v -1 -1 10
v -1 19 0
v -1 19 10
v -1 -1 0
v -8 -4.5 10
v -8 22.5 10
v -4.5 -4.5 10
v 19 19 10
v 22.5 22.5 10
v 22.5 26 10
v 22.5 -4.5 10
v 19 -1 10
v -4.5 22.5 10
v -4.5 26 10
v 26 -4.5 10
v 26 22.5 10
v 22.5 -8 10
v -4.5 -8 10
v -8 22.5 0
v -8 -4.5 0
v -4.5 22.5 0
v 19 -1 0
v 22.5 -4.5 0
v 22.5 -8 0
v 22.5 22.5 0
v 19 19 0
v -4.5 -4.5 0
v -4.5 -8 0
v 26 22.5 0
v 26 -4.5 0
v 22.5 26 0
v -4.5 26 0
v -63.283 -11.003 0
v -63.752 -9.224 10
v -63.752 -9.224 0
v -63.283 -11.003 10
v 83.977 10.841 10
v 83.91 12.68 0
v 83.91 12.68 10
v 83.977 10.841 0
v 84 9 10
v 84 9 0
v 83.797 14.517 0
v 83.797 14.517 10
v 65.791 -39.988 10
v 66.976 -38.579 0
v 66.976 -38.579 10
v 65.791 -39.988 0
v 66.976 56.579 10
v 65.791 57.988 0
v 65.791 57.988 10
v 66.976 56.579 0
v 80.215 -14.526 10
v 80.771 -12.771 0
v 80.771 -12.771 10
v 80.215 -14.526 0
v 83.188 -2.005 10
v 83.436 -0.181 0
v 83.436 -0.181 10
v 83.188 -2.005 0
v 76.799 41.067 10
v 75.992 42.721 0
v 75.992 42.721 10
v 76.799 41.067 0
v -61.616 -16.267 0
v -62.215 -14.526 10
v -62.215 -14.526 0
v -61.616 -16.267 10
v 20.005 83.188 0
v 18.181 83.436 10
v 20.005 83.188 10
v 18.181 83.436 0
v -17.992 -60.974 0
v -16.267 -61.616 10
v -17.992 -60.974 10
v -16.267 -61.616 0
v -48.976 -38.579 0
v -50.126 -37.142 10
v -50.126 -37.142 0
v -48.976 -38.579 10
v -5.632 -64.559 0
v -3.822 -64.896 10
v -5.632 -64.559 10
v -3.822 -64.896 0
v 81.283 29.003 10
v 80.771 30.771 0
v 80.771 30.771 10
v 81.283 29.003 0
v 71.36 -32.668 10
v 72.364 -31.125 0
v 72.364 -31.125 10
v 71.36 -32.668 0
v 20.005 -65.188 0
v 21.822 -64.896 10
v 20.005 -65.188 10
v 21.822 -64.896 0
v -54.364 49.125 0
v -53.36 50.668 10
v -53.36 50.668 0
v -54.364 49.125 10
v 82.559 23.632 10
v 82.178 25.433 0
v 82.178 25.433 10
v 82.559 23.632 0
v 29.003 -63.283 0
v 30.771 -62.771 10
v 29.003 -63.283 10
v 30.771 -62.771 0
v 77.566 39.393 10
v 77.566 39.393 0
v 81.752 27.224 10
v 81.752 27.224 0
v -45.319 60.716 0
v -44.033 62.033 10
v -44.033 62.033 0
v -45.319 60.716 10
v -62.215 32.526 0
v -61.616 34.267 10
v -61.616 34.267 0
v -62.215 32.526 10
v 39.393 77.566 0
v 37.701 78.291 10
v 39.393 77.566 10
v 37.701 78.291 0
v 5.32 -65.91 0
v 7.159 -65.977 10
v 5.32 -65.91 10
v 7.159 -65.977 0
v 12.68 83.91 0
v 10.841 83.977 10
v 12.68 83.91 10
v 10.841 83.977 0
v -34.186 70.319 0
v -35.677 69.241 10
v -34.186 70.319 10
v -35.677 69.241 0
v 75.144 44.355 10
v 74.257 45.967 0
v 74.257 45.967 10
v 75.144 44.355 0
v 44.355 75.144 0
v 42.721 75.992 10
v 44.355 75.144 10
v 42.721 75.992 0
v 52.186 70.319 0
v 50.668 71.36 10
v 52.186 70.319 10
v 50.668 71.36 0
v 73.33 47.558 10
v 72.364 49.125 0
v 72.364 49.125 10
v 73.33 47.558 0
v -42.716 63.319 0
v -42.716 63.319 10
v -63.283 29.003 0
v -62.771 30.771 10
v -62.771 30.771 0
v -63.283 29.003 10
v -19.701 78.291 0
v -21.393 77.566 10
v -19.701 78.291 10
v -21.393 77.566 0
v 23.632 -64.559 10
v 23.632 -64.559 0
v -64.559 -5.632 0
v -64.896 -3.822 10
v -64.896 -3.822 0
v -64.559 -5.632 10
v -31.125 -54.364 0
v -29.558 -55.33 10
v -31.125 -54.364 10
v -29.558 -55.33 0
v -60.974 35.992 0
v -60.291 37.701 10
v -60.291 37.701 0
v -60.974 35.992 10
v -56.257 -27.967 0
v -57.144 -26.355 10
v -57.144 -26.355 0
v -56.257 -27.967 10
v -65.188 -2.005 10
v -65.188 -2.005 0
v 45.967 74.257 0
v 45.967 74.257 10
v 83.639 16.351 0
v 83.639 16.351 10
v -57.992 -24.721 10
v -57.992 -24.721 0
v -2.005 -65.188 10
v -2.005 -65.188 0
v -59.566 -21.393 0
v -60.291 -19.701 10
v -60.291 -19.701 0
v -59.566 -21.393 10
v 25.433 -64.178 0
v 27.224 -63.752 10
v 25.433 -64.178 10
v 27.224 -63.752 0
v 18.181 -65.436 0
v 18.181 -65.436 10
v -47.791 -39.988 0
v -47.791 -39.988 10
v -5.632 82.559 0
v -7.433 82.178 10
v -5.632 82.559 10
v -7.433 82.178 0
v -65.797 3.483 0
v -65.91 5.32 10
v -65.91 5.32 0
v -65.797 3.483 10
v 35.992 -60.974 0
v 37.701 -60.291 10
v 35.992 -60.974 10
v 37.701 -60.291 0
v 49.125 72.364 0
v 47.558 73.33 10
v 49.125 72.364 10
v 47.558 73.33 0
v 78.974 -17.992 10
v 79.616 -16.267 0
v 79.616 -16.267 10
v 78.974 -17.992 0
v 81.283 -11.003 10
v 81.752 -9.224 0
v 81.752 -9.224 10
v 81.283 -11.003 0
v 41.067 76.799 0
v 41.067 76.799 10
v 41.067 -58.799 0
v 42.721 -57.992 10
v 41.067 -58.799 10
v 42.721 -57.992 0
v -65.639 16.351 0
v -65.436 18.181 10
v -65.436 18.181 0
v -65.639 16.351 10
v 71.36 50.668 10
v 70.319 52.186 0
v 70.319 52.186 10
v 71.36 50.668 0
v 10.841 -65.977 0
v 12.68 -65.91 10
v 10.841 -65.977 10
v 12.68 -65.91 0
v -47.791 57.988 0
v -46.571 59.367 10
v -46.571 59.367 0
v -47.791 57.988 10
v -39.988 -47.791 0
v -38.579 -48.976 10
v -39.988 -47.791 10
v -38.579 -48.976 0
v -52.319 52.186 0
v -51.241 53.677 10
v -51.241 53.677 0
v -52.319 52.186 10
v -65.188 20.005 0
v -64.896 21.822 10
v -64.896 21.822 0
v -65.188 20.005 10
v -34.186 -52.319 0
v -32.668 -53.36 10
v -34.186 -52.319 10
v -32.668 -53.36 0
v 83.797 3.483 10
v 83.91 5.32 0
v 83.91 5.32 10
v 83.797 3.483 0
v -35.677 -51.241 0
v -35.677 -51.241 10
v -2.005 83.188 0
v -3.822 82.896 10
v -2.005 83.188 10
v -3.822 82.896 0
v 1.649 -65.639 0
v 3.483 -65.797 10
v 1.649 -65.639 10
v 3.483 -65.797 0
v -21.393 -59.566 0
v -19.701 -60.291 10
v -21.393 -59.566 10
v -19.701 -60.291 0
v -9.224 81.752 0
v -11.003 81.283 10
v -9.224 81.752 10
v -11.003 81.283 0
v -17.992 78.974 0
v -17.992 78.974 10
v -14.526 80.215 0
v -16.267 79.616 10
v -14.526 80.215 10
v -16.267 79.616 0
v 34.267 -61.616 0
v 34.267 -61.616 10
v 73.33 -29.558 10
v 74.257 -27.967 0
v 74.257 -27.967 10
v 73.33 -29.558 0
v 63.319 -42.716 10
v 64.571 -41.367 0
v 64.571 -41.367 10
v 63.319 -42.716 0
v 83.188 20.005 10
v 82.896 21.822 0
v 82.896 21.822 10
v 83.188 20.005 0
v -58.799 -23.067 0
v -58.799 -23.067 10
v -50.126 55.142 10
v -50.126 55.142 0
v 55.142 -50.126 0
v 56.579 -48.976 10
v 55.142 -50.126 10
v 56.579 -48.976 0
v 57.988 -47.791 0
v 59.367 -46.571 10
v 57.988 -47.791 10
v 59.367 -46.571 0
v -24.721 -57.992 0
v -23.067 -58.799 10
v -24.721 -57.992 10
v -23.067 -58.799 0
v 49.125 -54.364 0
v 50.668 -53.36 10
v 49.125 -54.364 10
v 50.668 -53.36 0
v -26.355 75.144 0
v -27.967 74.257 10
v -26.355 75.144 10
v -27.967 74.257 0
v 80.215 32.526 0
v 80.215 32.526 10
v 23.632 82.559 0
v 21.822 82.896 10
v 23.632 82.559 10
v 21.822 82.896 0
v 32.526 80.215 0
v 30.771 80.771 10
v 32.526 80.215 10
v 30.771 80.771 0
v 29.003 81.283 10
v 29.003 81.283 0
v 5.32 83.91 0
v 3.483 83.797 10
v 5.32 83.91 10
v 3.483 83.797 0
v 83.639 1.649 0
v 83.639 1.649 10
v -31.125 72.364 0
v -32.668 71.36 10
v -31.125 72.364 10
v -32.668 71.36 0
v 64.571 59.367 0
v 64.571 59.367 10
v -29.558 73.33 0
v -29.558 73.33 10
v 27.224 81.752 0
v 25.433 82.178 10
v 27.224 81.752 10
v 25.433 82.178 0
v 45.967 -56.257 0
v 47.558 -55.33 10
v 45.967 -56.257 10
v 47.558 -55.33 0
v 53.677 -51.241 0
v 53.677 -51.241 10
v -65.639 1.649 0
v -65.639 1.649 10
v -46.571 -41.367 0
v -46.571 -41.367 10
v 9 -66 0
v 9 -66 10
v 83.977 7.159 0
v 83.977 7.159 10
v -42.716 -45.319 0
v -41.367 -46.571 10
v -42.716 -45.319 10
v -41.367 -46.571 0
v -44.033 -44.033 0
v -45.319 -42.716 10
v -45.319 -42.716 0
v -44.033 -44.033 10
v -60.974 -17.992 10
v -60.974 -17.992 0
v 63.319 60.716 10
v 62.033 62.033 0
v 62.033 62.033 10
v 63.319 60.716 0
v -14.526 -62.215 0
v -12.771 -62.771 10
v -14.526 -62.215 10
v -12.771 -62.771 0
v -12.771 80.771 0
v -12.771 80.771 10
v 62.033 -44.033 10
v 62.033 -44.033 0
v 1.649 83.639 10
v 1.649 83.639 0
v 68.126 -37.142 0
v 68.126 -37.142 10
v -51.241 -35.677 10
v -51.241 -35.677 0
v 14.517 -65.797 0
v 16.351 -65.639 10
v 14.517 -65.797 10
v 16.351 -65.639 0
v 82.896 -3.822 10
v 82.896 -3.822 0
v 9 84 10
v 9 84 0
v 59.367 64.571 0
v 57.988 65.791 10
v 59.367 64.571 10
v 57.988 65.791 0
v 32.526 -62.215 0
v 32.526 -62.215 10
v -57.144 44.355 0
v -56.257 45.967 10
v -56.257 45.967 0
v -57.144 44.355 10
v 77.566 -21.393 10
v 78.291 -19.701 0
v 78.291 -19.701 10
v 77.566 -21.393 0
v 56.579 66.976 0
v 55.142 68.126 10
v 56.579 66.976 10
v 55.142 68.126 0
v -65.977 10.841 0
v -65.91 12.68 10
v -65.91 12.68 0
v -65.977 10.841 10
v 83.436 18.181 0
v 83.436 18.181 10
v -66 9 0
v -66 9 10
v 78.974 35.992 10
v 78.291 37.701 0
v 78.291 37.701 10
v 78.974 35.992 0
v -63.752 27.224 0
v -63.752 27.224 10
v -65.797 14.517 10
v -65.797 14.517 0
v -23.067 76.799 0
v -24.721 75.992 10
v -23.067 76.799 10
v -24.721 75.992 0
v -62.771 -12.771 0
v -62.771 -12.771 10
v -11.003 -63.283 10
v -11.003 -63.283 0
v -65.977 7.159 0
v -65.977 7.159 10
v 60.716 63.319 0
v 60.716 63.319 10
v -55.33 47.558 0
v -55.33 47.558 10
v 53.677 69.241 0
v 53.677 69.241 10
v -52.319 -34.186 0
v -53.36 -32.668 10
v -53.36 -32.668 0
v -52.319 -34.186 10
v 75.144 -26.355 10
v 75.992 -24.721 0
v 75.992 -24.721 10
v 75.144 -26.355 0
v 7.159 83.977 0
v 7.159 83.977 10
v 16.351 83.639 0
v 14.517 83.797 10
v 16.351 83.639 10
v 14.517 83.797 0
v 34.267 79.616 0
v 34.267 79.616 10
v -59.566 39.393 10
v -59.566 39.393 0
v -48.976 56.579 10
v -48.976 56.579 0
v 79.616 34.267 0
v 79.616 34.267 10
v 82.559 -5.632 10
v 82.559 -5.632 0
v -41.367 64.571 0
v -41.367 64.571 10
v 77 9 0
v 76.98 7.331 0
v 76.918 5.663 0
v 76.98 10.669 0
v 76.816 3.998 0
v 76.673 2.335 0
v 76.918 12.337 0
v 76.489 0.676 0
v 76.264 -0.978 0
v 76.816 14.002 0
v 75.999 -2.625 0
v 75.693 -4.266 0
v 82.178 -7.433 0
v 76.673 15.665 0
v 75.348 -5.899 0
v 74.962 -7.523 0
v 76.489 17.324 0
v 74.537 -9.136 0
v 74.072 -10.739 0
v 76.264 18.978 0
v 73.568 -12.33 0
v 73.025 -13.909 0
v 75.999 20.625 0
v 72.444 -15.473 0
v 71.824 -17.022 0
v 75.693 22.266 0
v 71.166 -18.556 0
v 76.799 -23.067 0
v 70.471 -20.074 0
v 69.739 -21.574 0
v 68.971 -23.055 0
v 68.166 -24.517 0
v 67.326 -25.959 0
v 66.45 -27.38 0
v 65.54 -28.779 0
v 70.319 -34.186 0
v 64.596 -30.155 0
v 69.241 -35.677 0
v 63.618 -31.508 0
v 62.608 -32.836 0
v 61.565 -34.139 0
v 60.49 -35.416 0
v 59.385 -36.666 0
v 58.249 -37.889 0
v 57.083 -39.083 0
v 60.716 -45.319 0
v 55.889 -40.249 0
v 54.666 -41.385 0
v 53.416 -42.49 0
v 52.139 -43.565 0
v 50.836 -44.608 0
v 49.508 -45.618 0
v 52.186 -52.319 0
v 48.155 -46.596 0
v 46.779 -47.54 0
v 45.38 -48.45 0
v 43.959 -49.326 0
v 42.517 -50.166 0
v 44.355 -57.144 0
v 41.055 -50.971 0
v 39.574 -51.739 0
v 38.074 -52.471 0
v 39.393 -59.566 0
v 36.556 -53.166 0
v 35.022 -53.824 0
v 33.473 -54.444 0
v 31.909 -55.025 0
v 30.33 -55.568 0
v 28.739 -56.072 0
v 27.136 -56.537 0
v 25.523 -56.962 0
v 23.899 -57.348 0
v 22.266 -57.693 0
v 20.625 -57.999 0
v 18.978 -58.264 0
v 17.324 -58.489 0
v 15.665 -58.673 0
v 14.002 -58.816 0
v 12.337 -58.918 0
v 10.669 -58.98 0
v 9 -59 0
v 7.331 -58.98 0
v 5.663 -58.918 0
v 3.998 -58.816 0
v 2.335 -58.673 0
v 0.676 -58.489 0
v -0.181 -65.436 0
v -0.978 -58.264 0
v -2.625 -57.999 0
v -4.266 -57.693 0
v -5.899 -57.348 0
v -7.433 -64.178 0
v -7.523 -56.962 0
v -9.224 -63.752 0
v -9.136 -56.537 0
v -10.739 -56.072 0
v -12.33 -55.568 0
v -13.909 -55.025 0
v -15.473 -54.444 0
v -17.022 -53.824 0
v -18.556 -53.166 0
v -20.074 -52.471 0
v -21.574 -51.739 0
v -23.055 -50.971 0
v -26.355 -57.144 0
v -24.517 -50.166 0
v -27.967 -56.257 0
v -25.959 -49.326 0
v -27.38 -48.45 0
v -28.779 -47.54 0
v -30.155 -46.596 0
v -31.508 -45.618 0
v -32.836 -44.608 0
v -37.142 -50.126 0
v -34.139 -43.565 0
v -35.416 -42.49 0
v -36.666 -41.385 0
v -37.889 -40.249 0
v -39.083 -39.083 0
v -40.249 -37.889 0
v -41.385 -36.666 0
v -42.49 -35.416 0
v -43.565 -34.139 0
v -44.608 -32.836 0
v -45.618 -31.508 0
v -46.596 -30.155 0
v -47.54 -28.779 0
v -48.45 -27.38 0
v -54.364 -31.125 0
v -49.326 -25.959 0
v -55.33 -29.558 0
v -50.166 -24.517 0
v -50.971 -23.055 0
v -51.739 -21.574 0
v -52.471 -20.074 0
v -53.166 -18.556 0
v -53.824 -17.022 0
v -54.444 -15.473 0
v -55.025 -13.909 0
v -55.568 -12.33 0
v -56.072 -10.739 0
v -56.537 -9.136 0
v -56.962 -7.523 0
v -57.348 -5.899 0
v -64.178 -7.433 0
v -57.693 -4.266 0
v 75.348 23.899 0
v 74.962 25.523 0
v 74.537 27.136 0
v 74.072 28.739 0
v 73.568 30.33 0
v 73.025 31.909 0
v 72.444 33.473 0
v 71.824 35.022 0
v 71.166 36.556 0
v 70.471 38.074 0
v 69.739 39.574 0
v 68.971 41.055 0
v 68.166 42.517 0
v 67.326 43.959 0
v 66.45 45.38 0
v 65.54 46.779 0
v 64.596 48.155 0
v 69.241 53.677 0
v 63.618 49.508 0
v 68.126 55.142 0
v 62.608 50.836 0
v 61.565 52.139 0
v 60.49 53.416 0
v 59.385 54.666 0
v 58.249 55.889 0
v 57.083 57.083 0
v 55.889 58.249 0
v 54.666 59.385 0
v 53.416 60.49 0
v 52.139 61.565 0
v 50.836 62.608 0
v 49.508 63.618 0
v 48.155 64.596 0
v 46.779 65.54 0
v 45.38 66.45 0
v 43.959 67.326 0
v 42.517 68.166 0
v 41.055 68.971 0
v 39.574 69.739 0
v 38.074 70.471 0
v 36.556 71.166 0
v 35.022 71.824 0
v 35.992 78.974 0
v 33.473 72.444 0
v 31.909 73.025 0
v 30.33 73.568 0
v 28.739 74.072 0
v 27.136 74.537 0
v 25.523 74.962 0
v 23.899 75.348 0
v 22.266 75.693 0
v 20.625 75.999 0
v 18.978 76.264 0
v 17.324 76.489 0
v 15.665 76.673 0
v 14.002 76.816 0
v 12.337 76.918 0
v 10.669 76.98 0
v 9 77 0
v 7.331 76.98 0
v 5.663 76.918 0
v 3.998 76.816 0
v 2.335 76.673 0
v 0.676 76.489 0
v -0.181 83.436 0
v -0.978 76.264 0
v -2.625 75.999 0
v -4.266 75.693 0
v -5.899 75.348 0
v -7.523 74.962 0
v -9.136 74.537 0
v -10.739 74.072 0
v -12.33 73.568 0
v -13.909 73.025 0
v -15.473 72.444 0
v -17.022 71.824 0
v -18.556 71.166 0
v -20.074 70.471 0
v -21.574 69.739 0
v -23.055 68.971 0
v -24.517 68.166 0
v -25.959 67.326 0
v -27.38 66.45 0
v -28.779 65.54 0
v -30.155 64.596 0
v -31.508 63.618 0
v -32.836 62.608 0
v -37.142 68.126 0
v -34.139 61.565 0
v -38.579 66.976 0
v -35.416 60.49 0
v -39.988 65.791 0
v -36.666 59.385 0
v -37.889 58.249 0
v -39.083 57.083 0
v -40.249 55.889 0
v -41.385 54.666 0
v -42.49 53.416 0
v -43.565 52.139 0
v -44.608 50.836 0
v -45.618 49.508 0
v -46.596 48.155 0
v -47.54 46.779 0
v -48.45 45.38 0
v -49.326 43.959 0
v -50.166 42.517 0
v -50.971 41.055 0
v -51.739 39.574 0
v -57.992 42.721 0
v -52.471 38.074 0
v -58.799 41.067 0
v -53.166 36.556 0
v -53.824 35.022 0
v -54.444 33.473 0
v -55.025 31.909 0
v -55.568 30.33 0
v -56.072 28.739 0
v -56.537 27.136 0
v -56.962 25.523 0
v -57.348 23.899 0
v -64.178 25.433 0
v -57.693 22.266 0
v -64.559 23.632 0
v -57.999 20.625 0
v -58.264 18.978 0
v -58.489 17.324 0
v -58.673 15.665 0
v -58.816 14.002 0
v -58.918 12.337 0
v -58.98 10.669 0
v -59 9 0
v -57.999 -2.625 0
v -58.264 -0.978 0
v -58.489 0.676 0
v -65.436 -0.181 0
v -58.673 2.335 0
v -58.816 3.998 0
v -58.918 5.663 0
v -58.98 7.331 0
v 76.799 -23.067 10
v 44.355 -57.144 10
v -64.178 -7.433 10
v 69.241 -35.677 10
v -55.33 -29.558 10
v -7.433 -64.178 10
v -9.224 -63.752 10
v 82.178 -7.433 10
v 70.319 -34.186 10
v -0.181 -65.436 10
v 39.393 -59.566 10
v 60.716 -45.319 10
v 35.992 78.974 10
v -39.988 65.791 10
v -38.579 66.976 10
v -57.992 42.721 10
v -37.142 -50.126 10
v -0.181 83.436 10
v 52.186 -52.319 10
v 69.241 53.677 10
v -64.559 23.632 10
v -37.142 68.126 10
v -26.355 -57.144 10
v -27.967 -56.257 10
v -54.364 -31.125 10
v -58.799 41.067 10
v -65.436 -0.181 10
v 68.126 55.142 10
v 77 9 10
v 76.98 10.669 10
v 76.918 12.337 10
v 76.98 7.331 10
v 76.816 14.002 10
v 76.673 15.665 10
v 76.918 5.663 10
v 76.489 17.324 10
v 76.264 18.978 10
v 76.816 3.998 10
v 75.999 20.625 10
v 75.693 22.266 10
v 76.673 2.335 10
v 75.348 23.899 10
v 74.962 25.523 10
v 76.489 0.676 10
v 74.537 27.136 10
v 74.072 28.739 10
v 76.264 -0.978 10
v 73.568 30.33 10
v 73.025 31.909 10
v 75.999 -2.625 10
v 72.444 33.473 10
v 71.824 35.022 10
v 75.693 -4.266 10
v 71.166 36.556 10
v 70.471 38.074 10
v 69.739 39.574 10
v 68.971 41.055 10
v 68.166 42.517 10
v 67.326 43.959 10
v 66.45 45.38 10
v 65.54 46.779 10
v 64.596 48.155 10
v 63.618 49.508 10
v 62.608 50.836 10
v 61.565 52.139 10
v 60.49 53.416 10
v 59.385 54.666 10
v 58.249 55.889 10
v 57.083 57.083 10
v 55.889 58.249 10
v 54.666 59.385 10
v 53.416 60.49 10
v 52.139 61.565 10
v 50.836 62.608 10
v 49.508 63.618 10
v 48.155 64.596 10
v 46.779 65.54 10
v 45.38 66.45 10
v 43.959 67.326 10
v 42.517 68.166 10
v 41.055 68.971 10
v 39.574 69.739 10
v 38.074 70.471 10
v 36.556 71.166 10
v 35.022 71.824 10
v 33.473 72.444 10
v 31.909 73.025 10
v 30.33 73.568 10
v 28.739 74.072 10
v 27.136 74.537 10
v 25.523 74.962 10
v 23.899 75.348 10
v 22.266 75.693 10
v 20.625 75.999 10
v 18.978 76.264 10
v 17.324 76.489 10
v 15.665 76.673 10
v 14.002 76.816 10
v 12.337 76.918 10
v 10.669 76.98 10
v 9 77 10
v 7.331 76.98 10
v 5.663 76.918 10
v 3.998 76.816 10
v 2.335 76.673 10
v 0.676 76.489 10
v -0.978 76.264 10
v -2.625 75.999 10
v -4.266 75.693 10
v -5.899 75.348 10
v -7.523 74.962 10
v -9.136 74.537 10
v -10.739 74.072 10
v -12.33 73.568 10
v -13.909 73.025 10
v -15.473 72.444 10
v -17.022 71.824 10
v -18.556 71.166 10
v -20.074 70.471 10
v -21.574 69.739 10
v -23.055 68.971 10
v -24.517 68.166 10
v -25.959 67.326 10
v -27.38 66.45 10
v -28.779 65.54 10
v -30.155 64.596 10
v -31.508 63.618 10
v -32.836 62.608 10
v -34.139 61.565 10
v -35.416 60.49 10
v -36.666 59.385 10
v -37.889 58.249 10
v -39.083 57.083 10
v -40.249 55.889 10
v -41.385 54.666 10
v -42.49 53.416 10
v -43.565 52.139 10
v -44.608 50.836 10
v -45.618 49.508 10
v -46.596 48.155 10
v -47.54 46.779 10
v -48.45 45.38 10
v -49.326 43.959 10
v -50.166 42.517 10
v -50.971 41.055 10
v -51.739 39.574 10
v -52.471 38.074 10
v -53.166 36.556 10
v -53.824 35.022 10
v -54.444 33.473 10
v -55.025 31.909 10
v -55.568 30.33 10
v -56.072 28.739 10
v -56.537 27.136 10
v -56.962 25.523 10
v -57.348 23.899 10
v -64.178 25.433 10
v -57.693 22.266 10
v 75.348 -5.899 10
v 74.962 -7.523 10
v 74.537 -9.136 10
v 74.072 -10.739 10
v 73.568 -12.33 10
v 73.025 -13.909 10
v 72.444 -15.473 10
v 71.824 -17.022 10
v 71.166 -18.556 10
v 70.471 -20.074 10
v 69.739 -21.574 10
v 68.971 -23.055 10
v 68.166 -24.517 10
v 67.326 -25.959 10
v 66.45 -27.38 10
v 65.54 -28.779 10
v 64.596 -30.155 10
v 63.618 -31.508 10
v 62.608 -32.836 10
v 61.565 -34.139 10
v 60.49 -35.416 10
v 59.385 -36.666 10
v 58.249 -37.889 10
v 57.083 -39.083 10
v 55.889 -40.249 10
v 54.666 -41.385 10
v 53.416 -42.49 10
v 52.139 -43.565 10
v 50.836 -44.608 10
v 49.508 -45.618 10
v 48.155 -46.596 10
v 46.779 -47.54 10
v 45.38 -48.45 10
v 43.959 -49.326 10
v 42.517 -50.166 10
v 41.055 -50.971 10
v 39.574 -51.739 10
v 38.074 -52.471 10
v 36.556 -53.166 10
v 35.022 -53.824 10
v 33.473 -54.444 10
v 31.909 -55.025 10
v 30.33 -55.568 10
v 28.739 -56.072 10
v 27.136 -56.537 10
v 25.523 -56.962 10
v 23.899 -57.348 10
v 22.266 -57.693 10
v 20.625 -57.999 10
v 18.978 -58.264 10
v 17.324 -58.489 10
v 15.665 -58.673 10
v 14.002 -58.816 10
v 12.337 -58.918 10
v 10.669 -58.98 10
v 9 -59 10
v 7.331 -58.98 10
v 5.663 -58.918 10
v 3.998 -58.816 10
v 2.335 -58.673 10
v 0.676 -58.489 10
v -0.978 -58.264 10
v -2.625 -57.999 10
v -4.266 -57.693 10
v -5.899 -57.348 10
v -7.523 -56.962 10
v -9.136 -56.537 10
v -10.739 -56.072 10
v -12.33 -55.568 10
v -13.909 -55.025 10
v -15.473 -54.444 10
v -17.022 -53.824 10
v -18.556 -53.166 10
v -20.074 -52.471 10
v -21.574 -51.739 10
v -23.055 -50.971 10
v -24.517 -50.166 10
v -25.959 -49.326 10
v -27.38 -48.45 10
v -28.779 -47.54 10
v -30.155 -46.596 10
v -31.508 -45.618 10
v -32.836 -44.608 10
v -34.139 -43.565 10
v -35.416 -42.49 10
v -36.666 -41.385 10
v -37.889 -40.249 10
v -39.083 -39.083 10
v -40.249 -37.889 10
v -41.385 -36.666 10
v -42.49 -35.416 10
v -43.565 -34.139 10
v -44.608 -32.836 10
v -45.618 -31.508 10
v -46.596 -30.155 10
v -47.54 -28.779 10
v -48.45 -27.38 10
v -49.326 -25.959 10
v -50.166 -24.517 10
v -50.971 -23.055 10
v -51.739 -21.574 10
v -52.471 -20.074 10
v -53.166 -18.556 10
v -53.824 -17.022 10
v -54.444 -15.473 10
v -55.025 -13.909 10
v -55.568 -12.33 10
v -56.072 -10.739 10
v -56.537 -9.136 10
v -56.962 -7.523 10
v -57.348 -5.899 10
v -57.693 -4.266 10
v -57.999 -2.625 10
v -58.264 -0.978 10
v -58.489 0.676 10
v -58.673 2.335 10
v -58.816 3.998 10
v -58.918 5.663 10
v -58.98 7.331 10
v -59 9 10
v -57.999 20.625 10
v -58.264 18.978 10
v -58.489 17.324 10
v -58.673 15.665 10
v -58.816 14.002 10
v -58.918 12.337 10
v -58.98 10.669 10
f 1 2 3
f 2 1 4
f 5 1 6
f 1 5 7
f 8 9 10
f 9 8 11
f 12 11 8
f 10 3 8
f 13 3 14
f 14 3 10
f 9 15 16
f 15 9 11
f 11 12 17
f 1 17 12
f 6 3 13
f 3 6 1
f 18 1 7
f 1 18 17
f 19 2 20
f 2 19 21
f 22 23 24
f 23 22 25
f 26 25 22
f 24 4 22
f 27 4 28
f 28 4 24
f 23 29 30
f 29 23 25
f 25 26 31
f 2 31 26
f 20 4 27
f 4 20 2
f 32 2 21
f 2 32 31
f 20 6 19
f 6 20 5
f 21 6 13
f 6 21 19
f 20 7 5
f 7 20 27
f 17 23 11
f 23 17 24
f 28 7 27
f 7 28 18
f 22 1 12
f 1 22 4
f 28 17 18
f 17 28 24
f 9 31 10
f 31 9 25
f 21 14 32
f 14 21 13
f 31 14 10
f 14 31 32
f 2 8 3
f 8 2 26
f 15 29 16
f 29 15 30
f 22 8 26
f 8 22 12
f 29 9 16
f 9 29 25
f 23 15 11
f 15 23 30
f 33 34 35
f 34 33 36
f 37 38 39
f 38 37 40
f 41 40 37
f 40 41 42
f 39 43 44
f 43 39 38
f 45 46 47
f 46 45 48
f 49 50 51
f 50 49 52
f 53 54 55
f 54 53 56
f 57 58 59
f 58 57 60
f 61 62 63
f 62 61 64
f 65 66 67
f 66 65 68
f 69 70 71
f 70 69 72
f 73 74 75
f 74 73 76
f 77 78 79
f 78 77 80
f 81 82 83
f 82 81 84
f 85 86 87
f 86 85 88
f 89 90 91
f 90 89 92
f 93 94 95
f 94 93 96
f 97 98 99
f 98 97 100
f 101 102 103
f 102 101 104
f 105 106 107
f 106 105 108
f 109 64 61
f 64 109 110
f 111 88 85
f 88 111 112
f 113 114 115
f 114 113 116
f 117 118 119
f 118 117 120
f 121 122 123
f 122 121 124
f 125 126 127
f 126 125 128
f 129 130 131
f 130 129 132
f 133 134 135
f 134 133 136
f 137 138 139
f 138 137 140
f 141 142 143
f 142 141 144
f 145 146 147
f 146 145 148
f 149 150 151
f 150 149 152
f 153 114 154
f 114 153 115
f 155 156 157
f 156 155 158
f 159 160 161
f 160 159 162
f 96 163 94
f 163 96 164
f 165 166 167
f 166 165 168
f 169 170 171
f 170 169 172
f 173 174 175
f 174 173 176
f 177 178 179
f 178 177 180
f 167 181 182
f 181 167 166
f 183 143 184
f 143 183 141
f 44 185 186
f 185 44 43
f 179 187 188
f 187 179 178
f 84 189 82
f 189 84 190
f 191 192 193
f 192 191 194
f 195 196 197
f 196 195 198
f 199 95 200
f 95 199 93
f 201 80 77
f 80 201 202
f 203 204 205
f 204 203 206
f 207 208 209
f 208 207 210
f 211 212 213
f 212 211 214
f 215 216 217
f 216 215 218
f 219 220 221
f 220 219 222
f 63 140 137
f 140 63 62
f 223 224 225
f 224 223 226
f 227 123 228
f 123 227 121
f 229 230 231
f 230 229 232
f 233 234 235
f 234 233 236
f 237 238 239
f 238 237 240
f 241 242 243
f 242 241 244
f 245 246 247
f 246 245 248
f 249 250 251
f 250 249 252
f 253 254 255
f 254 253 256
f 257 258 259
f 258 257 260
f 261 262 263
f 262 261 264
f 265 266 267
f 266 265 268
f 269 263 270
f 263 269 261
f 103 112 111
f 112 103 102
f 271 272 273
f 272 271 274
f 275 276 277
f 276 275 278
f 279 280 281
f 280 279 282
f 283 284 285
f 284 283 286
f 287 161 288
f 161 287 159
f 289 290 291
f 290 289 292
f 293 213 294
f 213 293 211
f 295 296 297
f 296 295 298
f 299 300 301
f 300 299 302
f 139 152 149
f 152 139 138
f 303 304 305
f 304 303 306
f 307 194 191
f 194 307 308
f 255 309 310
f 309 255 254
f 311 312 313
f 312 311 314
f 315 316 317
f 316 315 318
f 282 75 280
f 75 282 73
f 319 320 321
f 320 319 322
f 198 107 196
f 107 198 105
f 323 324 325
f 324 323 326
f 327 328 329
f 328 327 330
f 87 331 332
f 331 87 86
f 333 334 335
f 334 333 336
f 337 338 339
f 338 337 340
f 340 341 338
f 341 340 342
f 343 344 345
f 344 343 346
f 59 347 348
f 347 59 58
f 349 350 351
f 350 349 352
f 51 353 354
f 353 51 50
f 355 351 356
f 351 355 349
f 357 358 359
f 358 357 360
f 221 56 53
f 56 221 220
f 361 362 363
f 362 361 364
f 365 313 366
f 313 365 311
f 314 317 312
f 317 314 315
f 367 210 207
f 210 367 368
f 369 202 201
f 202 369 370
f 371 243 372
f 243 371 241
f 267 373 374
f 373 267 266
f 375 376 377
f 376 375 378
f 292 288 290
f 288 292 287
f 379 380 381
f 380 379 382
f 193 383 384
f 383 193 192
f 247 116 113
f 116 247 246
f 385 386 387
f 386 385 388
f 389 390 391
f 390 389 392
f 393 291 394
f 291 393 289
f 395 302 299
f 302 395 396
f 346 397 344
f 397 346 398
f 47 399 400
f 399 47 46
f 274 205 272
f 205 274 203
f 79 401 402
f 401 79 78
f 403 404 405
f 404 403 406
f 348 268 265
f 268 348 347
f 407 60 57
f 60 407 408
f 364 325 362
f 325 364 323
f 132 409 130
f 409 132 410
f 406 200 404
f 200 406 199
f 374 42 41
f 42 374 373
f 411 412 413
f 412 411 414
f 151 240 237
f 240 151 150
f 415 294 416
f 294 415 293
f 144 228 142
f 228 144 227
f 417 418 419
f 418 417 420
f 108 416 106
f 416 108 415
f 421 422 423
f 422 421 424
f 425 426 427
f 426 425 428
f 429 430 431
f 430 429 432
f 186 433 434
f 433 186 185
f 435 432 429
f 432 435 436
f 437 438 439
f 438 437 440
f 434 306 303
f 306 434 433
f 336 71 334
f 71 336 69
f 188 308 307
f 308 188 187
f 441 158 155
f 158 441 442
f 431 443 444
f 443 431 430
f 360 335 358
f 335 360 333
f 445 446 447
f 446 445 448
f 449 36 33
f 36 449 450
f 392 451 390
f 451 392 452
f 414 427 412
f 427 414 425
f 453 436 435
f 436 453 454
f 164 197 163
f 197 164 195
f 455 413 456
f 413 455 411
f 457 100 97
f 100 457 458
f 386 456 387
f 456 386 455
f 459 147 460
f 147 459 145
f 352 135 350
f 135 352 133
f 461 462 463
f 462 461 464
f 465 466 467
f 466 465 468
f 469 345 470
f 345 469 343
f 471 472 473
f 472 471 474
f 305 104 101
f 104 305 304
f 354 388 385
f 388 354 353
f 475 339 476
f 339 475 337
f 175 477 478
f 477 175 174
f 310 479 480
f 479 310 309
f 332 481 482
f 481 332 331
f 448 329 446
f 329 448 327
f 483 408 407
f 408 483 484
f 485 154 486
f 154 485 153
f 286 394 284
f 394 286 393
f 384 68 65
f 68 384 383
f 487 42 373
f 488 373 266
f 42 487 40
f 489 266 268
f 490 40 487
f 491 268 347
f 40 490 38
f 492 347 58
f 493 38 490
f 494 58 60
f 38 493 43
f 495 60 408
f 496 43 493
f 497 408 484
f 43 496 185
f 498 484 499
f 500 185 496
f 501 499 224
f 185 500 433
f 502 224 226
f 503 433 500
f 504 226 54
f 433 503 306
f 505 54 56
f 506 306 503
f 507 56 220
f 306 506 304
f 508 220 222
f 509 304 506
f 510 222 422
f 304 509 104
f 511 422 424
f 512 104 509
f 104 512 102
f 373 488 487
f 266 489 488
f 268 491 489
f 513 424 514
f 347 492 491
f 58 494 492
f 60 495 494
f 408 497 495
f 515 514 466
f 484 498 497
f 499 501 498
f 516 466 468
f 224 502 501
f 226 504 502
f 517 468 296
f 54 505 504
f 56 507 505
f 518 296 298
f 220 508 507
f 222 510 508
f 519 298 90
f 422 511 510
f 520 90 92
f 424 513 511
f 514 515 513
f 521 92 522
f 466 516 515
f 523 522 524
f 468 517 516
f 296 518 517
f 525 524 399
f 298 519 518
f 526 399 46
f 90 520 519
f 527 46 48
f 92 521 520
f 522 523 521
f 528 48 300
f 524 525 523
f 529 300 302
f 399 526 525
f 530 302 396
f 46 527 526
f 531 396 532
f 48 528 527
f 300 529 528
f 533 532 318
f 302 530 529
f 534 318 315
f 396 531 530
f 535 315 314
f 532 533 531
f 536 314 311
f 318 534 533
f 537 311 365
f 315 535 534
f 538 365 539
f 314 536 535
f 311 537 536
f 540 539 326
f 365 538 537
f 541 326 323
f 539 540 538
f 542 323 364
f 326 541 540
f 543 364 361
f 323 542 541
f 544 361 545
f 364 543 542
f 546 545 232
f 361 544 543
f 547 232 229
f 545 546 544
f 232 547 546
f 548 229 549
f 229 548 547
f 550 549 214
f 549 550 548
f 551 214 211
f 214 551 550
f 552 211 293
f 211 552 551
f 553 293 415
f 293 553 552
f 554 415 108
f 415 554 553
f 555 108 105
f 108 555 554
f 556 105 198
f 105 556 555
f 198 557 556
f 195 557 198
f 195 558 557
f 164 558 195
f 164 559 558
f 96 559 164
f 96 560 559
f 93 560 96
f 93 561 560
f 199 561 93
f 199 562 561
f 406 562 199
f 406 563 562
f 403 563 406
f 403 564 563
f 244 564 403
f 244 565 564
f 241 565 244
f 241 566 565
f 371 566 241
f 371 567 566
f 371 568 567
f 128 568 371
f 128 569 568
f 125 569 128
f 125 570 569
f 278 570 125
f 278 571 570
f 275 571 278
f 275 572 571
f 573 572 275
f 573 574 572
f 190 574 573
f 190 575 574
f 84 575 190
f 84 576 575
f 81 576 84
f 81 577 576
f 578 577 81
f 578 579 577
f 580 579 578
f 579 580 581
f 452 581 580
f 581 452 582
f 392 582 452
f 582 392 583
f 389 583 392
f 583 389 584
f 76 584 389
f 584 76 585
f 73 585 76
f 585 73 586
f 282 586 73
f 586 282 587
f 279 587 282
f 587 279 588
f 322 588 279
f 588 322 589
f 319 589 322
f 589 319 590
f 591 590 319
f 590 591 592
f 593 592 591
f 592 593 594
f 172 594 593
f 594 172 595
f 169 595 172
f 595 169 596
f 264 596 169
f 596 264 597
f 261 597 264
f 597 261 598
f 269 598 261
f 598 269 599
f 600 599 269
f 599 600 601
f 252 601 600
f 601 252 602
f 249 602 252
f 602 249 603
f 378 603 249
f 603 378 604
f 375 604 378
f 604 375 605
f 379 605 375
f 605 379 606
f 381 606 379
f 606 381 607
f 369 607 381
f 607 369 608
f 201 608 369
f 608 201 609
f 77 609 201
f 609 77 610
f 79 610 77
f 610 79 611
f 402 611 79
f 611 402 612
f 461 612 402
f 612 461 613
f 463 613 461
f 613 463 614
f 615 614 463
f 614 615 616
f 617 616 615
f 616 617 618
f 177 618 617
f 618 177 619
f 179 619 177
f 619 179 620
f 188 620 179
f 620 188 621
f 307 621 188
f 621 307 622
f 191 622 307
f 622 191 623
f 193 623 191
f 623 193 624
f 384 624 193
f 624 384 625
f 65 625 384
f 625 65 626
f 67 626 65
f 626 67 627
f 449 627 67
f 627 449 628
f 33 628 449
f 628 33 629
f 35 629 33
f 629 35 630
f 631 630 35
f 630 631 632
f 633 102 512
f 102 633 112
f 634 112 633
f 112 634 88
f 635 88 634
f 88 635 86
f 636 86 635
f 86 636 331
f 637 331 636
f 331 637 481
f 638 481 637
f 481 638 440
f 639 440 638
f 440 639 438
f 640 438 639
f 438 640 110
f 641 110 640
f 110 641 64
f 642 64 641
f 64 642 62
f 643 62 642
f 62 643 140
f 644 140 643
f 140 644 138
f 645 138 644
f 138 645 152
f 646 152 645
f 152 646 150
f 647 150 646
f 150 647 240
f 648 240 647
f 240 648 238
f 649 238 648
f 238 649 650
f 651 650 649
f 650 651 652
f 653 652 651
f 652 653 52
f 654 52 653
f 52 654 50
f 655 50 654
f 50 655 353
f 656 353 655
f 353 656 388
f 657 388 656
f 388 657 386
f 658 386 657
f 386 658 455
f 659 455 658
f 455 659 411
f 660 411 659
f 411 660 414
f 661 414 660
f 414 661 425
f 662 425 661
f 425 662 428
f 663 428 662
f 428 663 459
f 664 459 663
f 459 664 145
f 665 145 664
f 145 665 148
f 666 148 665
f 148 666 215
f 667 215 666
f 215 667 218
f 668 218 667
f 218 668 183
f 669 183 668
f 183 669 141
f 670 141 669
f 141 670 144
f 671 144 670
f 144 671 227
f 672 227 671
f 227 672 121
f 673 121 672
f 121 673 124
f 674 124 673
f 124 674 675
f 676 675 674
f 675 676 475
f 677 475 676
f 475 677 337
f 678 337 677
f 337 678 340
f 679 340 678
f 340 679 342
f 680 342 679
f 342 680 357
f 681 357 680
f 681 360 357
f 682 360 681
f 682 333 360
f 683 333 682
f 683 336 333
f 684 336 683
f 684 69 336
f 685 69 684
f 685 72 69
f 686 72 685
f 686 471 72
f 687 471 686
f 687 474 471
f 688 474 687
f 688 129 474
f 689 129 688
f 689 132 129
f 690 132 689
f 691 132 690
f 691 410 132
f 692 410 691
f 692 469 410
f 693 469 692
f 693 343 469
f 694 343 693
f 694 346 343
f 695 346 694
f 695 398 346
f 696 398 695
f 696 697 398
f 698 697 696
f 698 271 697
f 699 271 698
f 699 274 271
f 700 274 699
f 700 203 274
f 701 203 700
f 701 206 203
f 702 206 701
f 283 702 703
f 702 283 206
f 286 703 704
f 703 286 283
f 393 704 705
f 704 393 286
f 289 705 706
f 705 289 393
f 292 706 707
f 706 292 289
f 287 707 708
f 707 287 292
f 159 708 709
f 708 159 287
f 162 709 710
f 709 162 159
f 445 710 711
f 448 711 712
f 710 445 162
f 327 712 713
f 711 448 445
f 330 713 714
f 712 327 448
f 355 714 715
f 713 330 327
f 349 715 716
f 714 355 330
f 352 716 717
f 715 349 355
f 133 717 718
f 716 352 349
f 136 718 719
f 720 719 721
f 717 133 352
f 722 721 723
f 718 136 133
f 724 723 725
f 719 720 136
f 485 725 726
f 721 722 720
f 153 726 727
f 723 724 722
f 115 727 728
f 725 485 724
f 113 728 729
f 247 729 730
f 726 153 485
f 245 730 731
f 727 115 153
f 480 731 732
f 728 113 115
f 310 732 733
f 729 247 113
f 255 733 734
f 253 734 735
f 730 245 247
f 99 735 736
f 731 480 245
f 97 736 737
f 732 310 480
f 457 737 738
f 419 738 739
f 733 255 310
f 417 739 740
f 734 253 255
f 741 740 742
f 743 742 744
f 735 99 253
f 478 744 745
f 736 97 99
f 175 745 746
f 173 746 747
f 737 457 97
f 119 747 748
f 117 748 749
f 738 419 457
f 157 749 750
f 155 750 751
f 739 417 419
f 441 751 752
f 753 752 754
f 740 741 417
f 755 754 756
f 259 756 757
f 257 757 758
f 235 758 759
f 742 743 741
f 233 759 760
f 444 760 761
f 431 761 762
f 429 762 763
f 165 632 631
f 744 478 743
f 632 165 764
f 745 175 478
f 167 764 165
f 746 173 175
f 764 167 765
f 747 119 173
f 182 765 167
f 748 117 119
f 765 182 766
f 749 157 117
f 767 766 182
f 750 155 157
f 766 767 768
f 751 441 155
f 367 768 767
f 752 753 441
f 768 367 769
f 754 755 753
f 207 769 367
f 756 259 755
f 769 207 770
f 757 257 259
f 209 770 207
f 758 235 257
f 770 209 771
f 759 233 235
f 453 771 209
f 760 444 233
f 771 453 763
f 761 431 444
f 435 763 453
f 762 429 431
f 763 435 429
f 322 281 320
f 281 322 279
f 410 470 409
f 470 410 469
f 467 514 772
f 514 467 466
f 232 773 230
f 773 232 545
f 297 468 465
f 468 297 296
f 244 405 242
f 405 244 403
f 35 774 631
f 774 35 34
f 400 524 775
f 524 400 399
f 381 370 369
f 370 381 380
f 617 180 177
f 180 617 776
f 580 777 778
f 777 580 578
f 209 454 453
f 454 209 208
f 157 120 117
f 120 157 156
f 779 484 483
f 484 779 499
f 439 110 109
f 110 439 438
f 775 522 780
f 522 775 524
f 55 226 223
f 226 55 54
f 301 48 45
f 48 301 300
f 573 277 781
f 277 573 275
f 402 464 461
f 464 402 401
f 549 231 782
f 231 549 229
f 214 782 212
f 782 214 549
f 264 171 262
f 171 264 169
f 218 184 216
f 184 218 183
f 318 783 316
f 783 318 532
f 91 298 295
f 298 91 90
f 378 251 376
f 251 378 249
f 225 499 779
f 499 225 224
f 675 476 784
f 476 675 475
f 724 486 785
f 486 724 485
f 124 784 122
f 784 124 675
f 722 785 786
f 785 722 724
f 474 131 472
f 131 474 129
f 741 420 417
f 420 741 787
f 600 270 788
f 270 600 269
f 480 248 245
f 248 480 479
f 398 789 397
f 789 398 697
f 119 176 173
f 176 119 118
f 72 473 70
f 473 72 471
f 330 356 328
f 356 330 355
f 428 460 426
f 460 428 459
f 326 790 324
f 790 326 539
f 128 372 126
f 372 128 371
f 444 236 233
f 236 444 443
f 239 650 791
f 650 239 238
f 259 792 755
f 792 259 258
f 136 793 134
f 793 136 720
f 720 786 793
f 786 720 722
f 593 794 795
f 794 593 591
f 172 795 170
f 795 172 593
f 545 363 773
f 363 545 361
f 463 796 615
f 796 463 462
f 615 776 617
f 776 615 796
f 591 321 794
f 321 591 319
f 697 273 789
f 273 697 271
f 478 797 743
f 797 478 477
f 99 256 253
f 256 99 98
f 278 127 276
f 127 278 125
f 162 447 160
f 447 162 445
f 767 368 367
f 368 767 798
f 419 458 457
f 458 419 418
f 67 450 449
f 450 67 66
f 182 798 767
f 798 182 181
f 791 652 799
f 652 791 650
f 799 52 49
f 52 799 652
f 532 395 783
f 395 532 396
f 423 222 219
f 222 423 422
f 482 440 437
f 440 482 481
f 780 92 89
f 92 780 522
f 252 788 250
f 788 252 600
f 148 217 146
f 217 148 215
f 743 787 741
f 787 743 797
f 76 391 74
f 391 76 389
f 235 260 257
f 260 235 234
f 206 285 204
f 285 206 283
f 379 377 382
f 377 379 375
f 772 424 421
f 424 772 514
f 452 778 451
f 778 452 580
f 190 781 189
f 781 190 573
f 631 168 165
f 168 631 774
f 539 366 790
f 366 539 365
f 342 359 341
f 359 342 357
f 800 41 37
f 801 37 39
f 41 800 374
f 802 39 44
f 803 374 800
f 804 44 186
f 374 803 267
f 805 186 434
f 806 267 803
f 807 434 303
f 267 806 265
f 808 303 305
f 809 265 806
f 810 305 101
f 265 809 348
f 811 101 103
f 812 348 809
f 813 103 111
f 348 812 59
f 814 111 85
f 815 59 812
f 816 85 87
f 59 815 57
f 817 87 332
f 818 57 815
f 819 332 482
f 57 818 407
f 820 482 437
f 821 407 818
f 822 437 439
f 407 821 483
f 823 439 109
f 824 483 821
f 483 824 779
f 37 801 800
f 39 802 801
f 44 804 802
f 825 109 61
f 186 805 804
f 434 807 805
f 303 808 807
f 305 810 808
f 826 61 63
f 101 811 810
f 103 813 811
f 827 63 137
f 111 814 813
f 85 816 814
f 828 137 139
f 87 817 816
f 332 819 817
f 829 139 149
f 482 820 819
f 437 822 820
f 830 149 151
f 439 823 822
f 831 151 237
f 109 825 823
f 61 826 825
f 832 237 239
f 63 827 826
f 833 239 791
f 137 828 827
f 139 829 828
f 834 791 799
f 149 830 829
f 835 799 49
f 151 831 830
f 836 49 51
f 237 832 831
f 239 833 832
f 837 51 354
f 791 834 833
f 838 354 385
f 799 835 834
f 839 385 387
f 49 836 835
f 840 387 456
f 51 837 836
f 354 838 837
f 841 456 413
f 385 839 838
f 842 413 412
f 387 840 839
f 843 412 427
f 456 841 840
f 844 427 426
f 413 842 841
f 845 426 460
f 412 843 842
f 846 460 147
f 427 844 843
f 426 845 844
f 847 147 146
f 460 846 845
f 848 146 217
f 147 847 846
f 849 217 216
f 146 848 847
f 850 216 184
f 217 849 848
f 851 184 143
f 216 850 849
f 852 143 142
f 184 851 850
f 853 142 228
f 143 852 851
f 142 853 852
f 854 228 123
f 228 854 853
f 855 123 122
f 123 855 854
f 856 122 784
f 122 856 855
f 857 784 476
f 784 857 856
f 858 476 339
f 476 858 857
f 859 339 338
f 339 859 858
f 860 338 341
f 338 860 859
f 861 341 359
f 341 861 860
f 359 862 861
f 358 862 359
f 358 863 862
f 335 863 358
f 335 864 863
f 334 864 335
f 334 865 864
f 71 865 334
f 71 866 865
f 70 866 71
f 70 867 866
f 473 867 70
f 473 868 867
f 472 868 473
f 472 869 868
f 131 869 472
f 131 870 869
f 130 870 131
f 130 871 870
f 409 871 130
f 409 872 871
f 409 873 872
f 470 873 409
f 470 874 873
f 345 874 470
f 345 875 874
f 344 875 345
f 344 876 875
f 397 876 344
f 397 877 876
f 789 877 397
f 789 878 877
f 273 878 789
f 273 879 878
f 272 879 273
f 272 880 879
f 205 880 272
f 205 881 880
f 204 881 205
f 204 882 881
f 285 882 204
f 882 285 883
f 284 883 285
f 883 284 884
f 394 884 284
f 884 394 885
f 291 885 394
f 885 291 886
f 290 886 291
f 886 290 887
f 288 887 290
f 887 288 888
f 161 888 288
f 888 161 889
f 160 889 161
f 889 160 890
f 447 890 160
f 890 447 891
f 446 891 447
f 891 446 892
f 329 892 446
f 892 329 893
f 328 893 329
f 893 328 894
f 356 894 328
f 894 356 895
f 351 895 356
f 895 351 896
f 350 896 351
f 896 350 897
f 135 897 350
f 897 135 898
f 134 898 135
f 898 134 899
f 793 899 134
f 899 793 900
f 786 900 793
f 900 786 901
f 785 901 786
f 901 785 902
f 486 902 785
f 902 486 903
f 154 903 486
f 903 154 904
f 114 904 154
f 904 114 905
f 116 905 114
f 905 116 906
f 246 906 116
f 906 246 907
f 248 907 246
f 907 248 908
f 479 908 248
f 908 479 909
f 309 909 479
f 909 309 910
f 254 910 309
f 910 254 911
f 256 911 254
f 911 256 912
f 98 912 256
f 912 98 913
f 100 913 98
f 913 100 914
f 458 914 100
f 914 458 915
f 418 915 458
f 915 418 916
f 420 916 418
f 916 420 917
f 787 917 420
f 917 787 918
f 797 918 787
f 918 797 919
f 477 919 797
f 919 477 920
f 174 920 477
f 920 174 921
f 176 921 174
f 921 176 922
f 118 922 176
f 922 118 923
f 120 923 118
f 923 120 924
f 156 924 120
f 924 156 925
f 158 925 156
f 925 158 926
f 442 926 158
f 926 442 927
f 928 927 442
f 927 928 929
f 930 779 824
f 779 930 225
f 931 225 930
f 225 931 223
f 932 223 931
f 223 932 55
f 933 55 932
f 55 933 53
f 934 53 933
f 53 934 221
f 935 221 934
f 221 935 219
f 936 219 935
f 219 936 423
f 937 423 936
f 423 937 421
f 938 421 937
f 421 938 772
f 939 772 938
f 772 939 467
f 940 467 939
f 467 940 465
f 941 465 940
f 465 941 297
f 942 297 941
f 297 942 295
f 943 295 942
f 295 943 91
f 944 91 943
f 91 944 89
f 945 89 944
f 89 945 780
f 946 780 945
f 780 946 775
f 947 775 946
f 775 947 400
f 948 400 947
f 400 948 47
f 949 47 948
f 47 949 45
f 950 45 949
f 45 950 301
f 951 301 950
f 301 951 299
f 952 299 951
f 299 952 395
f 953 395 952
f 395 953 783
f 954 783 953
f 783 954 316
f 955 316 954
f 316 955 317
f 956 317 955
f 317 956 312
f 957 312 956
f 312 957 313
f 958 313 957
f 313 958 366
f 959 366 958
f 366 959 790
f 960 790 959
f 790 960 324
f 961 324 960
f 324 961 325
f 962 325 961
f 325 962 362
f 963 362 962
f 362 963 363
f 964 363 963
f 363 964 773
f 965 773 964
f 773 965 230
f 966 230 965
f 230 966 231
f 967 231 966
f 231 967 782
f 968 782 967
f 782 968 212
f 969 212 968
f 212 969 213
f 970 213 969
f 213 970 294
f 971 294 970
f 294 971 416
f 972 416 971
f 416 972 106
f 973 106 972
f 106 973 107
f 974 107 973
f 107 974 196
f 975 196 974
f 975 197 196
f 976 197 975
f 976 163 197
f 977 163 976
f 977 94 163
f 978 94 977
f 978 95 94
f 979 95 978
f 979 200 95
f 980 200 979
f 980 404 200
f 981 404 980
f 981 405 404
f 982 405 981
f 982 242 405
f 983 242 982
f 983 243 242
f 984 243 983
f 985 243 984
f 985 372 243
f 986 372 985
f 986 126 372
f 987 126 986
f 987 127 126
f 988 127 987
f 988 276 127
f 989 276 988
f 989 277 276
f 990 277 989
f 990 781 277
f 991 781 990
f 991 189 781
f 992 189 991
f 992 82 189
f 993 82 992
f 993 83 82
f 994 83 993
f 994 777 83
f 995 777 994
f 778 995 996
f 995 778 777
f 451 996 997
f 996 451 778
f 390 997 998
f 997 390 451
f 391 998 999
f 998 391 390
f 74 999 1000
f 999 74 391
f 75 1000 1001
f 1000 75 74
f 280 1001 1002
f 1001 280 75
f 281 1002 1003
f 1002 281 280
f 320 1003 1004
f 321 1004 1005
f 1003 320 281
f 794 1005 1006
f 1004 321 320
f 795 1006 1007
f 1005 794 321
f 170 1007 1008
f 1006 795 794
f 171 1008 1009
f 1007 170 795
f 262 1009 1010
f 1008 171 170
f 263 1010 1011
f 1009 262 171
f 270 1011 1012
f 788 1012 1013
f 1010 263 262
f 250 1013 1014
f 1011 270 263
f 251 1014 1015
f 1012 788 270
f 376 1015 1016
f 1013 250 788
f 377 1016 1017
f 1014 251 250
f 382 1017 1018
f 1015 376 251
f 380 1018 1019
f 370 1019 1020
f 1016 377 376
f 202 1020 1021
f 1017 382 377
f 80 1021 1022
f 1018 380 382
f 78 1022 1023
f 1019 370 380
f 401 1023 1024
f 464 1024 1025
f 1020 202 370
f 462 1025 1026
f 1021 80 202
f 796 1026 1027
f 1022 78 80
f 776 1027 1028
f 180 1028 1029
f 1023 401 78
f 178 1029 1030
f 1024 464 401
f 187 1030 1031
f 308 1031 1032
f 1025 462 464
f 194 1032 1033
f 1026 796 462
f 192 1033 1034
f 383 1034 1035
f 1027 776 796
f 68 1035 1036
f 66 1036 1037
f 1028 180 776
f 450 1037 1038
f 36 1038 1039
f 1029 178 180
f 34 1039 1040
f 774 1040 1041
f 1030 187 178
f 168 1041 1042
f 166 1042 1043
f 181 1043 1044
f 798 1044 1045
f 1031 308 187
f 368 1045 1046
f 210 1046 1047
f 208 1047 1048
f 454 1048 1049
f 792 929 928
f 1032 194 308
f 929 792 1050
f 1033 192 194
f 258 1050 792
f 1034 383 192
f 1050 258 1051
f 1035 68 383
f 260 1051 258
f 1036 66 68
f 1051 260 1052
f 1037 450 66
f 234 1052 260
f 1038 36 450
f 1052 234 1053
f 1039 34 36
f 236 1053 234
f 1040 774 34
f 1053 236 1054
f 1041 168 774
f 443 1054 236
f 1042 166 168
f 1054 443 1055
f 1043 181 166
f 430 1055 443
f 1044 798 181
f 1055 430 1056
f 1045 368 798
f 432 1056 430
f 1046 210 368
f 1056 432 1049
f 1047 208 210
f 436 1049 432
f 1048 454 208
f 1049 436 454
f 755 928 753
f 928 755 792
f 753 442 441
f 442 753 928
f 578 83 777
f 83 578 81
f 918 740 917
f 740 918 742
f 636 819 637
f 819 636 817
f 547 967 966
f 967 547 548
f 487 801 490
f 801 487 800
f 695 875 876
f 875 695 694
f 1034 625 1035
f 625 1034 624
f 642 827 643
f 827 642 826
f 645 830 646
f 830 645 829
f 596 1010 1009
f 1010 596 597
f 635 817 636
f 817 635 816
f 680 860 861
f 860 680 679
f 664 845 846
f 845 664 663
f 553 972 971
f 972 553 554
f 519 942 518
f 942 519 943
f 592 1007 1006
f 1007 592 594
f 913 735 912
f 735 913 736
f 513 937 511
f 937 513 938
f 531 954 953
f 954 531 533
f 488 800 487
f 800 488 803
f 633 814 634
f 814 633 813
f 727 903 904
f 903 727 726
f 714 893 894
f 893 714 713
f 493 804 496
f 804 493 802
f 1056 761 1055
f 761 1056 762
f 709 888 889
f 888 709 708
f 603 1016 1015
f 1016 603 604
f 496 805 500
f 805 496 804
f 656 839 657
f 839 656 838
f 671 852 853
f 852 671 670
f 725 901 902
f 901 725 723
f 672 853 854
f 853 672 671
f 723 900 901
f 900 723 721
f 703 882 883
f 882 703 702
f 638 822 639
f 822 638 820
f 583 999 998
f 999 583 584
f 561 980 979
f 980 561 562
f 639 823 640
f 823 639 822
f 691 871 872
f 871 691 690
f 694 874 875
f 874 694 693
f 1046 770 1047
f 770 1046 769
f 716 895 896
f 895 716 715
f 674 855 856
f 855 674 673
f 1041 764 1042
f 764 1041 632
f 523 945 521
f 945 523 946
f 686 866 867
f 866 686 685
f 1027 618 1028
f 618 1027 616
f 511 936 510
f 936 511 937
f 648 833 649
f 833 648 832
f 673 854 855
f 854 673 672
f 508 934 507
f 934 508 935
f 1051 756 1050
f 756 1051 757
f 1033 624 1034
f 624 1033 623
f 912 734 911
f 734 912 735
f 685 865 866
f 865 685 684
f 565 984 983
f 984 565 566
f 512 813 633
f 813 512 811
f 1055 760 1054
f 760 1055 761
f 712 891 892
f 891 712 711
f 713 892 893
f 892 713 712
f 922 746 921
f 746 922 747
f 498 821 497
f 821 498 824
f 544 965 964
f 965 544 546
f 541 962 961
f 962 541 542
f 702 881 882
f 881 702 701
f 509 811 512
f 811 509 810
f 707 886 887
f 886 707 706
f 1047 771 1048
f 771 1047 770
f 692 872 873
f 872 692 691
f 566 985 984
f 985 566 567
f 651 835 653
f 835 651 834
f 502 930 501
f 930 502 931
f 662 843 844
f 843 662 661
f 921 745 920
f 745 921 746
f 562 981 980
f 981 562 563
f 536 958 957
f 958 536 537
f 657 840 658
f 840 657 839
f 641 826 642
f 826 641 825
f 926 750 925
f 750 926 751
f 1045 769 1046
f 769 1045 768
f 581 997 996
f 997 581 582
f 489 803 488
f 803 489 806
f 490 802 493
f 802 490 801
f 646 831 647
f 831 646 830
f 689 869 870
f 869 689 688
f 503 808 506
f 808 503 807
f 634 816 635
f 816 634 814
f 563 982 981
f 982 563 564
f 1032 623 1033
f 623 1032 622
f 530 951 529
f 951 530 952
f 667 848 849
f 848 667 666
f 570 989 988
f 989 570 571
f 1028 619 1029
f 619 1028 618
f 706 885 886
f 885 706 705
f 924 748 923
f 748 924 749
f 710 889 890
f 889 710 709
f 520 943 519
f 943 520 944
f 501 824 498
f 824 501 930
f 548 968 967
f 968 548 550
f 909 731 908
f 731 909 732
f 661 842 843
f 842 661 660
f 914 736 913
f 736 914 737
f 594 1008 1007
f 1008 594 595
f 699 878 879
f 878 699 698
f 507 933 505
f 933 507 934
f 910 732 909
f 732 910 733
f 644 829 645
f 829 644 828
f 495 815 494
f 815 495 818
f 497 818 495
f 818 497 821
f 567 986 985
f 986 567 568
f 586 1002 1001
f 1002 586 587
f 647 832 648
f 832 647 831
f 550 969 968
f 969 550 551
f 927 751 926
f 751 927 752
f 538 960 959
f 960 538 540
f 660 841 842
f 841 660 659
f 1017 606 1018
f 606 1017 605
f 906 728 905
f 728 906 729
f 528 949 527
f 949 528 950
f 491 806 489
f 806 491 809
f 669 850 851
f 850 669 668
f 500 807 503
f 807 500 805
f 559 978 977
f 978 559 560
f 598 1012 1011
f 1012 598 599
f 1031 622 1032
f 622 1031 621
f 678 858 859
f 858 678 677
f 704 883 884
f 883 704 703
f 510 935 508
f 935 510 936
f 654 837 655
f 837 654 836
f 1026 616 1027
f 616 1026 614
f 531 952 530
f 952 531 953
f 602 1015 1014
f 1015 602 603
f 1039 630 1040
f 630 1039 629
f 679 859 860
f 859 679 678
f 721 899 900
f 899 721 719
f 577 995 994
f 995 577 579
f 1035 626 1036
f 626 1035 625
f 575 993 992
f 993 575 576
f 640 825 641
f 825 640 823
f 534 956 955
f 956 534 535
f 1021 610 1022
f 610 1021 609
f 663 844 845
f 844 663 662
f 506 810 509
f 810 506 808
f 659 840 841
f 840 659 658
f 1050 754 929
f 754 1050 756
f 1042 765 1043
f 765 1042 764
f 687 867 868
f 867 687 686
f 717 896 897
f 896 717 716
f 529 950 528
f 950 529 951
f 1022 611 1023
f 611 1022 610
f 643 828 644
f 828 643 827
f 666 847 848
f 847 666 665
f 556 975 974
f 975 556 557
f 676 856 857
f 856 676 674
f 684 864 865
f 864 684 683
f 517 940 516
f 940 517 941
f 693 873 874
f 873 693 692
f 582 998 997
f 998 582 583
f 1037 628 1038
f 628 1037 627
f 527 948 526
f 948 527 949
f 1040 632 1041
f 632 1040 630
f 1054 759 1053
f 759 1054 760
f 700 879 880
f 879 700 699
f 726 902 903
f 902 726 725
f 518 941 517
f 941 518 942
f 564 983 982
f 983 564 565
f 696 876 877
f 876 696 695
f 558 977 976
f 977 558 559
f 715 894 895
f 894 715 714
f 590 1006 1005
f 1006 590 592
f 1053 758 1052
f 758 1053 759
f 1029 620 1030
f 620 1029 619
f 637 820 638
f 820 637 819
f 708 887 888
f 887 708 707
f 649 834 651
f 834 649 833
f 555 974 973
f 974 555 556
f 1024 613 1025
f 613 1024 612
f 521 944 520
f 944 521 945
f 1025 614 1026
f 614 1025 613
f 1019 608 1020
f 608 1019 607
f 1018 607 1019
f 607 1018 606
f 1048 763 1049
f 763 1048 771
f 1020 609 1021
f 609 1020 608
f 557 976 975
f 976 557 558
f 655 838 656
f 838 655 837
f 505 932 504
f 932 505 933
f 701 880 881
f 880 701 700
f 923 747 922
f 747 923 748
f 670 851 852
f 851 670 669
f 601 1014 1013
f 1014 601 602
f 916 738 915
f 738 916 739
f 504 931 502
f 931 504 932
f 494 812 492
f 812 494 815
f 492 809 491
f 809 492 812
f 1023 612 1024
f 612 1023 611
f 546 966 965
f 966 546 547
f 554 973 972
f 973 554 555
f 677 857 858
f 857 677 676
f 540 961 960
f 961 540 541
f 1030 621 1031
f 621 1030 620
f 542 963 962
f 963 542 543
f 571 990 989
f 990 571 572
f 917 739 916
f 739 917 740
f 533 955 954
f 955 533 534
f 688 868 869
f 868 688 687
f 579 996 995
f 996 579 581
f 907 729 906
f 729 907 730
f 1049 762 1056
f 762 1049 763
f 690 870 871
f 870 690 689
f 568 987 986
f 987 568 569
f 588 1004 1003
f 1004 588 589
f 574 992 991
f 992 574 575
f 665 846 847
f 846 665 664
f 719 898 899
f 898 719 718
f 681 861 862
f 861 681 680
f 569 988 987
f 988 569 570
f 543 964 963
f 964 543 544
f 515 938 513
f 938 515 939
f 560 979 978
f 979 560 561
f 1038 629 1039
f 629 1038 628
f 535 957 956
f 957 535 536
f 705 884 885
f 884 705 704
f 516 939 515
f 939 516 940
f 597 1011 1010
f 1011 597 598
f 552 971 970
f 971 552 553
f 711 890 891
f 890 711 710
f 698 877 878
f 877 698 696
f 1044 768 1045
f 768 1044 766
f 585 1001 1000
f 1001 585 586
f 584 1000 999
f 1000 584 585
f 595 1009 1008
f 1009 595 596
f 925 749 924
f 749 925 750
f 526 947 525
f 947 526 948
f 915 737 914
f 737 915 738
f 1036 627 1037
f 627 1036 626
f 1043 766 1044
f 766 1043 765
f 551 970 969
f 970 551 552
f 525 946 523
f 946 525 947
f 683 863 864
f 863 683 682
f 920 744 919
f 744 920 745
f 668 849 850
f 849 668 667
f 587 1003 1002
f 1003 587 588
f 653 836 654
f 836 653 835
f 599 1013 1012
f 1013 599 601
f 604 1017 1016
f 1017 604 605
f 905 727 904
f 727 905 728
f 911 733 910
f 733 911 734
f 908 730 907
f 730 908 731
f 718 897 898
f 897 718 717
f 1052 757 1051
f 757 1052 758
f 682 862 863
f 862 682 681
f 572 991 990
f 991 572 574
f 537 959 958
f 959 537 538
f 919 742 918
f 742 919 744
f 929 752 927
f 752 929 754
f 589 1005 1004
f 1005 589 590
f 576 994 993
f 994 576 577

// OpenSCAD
// Generated by SolidPython 1.1.3 on 2026-06-23 12:56:08


union() {
	union() {
		translate(v = [-4.5000000000, 9.0000000000, 5.0000000000]) {
			cube(center = true, size = [7, 27, 10]);
		}
		translate(v = [9.0000000000, -4.5000000000, 5.0000000000]) {
			cube(center = true, size = [27, 7, 10]);
		}
		translate(v = [0, 27]) {
			translate(v = [9.0000000000, -4.5000000000, 5.0000000000]) {
				cube(center = true, size = [27, 7, 10]);
			}
		}
		translate(v = [27, 0]) {
			translate(v = [-4.5000000000, 9.0000000000, 5.0000000000]) {
				cube(center = true, size = [7, 27, 10]);
			}
		}
	}
	translate(v = [9.0000000000, 9.0000000000]) {
		difference() {
			cylinder($fn = 256, h = 10, r = 75.0000000000);
			cylinder($fn = 256, h = 10, r = 68.0000000000);
		}
	}
}
/***********************************************
*********      SolidPython code:      **********
************************************************

"""SCAD file export functions.

This module provides functions for exporting OpenSCAD geometries to .scad files.
"""

from typing import Dict, Optional
from pathlib import Path
import solid

from .config import ExportConfiguration, FileNamingConfig


def export_scad(
    geometry: solid.OpenSCADObject, output_path: Path, header: Optional[str] = None
) -> Path:
    """Export geometry to SCAD file.

    Parameters
    ----------
    geometry : solid.OpenSCADObject
        Geometry to export.
    output_path : Path
        Output file path.
    header : str, optional
        Header comment to add to SCAD file.

    Returns
    -------
    Path
        Path to created SCAD file.

    Raises
    ------
    IOError
        If file cannot be written.

    Examples
    --------
    >>> from pathlib import Path
    >>> import solid
    >>>
    >>> geometry = solid.cube([10, 10, 10])
    >>> output_path = Path('output/device.scad')
    >>> export_scad(geometry, output_path)
    """
    # Ensure parent directory exists
    output_path.parent.mkdir(parents=True, exist_ok=True)

    # Render to file
    try:
        solid.scad_render_to_file(geometry, str(output_path))
    except Exception as e:
        raise IOError(f"Failed to write SCAD file to {output_path}: {e}")

    _normalize_scad_file(output_path)

    # Add header if provided
    if header:
        _add_header_to_scad(output_path, header)
        _normalize_scad_file(output_path)

    return output_path


def _normalize_scad_file(scad_path: Path) -> None:
    """Strip trailing whitespace from generated SCAD text."""
    content = scad_path.read_text()
    normalized = "\n".join(line.rstrip() for line in content.splitlines()) + "\n"
    if normalized != content:
        scad_path.write_text(normalized)


def export_multiple_scad(
    geometries: Dict[str, solid.OpenSCADObject],
    config: ExportConfiguration,
    naming_config: Optional[FileNamingConfig] = None,
) -> Dict[str, Path]:
    """Export multiple geometries to SCAD files.

    Parameters
    ----------
    geometries : dict
        Dictionary mapping prefixes to geometries.
        Keys are used as filename prefixes.
    config : ExportConfiguration
        Export configuration.
    naming_config : FileNamingConfig, optional
        File naming configuration.

    Returns
    -------
    dict
        Dictionary mapping prefixes to output paths.

    Examples
    --------
    >>> geometries = {
    ...     'wells': wells_geometry,
    ...     'channels': channels_geometry,
    ...     'device': device_geometry
    ... }
    >>> config = ExportConfiguration(output_directory=Path('output'))
    >>> paths = export_multiple_scad(geometries, config)
    """
    output_paths = {}

    for prefix, geometry in geometries.items():
        # Create naming config for this geometry
        if naming_config:
            file_config = FileNamingConfig(
                prefix=prefix,
                version=naming_config.version,
                grid_size=naming_config.grid_size,
                suffix=naming_config.suffix,
            )
        else:
            file_config = FileNamingConfig(prefix=prefix)

        # Generate filename
        filename = file_config.generate_filename("scad")
        output_path = config.get_output_path(filename)

        # Export
        export_scad(geometry, output_path)
        output_paths[prefix] = output_path

    return output_paths


def _add_header_to_scad(scad_path: Path, header: str):
    """Add header comment to existing SCAD file.

    Parameters
    ----------
    scad_path : Path
        Path to SCAD file.
    header : str
        Header text to add.
    """
    # Read existing content
    with open(scad_path, "r") as f:
        content = f.read()

    # Prepend header
    header_comment = f"// {header}\n\n"
    with open(scad_path, "w") as f:
        f.write(header_comment + content)


def generate_scad_header(
    device_name: str, version: Optional[str] = None, description: Optional[str] = None
) -> str:
    """Generate SCAD file header comment.

    Parameters
    ----------
    device_name : str
        Device name.
    version : str, optional
        Version string.
    description : str, optional
        Device description.

    Returns
    -------
    str
        Header comment text.

    Examples
    --------
    >>> header = generate_scad_header(
    ...     'Two Compartment Device',
    ...     version='v1',
    ...     description='96-well format with microchannels'
    ... )
    """
    lines = []
    lines.append("=" * 60)
    lines.append(f"Device: {device_name}")

    if version:
        lines.append(f"Version: {version}")

    if description:
        lines.append(f"Description: {description}")

    lines.append("Generated by OpenMFD")
    lines.append("=" * 60)

    return "\n".join(lines)


def validate_scad_file(scad_path: Path) -> bool:
    """Validate that SCAD file exists and is readable.

    Parameters
    ----------
    scad_path : Path
        Path to SCAD file.

    Returns
    -------
    bool
        True if file is valid, False otherwise.
    """
    if not scad_path.exists():
        return False

    if not scad_path.is_file():
        return False

    # Try to read file
    try:
        with open(scad_path, "r") as f:
            content = f.read()
        return len(content) > 0
    except Exception:
        return False


************************************************/
